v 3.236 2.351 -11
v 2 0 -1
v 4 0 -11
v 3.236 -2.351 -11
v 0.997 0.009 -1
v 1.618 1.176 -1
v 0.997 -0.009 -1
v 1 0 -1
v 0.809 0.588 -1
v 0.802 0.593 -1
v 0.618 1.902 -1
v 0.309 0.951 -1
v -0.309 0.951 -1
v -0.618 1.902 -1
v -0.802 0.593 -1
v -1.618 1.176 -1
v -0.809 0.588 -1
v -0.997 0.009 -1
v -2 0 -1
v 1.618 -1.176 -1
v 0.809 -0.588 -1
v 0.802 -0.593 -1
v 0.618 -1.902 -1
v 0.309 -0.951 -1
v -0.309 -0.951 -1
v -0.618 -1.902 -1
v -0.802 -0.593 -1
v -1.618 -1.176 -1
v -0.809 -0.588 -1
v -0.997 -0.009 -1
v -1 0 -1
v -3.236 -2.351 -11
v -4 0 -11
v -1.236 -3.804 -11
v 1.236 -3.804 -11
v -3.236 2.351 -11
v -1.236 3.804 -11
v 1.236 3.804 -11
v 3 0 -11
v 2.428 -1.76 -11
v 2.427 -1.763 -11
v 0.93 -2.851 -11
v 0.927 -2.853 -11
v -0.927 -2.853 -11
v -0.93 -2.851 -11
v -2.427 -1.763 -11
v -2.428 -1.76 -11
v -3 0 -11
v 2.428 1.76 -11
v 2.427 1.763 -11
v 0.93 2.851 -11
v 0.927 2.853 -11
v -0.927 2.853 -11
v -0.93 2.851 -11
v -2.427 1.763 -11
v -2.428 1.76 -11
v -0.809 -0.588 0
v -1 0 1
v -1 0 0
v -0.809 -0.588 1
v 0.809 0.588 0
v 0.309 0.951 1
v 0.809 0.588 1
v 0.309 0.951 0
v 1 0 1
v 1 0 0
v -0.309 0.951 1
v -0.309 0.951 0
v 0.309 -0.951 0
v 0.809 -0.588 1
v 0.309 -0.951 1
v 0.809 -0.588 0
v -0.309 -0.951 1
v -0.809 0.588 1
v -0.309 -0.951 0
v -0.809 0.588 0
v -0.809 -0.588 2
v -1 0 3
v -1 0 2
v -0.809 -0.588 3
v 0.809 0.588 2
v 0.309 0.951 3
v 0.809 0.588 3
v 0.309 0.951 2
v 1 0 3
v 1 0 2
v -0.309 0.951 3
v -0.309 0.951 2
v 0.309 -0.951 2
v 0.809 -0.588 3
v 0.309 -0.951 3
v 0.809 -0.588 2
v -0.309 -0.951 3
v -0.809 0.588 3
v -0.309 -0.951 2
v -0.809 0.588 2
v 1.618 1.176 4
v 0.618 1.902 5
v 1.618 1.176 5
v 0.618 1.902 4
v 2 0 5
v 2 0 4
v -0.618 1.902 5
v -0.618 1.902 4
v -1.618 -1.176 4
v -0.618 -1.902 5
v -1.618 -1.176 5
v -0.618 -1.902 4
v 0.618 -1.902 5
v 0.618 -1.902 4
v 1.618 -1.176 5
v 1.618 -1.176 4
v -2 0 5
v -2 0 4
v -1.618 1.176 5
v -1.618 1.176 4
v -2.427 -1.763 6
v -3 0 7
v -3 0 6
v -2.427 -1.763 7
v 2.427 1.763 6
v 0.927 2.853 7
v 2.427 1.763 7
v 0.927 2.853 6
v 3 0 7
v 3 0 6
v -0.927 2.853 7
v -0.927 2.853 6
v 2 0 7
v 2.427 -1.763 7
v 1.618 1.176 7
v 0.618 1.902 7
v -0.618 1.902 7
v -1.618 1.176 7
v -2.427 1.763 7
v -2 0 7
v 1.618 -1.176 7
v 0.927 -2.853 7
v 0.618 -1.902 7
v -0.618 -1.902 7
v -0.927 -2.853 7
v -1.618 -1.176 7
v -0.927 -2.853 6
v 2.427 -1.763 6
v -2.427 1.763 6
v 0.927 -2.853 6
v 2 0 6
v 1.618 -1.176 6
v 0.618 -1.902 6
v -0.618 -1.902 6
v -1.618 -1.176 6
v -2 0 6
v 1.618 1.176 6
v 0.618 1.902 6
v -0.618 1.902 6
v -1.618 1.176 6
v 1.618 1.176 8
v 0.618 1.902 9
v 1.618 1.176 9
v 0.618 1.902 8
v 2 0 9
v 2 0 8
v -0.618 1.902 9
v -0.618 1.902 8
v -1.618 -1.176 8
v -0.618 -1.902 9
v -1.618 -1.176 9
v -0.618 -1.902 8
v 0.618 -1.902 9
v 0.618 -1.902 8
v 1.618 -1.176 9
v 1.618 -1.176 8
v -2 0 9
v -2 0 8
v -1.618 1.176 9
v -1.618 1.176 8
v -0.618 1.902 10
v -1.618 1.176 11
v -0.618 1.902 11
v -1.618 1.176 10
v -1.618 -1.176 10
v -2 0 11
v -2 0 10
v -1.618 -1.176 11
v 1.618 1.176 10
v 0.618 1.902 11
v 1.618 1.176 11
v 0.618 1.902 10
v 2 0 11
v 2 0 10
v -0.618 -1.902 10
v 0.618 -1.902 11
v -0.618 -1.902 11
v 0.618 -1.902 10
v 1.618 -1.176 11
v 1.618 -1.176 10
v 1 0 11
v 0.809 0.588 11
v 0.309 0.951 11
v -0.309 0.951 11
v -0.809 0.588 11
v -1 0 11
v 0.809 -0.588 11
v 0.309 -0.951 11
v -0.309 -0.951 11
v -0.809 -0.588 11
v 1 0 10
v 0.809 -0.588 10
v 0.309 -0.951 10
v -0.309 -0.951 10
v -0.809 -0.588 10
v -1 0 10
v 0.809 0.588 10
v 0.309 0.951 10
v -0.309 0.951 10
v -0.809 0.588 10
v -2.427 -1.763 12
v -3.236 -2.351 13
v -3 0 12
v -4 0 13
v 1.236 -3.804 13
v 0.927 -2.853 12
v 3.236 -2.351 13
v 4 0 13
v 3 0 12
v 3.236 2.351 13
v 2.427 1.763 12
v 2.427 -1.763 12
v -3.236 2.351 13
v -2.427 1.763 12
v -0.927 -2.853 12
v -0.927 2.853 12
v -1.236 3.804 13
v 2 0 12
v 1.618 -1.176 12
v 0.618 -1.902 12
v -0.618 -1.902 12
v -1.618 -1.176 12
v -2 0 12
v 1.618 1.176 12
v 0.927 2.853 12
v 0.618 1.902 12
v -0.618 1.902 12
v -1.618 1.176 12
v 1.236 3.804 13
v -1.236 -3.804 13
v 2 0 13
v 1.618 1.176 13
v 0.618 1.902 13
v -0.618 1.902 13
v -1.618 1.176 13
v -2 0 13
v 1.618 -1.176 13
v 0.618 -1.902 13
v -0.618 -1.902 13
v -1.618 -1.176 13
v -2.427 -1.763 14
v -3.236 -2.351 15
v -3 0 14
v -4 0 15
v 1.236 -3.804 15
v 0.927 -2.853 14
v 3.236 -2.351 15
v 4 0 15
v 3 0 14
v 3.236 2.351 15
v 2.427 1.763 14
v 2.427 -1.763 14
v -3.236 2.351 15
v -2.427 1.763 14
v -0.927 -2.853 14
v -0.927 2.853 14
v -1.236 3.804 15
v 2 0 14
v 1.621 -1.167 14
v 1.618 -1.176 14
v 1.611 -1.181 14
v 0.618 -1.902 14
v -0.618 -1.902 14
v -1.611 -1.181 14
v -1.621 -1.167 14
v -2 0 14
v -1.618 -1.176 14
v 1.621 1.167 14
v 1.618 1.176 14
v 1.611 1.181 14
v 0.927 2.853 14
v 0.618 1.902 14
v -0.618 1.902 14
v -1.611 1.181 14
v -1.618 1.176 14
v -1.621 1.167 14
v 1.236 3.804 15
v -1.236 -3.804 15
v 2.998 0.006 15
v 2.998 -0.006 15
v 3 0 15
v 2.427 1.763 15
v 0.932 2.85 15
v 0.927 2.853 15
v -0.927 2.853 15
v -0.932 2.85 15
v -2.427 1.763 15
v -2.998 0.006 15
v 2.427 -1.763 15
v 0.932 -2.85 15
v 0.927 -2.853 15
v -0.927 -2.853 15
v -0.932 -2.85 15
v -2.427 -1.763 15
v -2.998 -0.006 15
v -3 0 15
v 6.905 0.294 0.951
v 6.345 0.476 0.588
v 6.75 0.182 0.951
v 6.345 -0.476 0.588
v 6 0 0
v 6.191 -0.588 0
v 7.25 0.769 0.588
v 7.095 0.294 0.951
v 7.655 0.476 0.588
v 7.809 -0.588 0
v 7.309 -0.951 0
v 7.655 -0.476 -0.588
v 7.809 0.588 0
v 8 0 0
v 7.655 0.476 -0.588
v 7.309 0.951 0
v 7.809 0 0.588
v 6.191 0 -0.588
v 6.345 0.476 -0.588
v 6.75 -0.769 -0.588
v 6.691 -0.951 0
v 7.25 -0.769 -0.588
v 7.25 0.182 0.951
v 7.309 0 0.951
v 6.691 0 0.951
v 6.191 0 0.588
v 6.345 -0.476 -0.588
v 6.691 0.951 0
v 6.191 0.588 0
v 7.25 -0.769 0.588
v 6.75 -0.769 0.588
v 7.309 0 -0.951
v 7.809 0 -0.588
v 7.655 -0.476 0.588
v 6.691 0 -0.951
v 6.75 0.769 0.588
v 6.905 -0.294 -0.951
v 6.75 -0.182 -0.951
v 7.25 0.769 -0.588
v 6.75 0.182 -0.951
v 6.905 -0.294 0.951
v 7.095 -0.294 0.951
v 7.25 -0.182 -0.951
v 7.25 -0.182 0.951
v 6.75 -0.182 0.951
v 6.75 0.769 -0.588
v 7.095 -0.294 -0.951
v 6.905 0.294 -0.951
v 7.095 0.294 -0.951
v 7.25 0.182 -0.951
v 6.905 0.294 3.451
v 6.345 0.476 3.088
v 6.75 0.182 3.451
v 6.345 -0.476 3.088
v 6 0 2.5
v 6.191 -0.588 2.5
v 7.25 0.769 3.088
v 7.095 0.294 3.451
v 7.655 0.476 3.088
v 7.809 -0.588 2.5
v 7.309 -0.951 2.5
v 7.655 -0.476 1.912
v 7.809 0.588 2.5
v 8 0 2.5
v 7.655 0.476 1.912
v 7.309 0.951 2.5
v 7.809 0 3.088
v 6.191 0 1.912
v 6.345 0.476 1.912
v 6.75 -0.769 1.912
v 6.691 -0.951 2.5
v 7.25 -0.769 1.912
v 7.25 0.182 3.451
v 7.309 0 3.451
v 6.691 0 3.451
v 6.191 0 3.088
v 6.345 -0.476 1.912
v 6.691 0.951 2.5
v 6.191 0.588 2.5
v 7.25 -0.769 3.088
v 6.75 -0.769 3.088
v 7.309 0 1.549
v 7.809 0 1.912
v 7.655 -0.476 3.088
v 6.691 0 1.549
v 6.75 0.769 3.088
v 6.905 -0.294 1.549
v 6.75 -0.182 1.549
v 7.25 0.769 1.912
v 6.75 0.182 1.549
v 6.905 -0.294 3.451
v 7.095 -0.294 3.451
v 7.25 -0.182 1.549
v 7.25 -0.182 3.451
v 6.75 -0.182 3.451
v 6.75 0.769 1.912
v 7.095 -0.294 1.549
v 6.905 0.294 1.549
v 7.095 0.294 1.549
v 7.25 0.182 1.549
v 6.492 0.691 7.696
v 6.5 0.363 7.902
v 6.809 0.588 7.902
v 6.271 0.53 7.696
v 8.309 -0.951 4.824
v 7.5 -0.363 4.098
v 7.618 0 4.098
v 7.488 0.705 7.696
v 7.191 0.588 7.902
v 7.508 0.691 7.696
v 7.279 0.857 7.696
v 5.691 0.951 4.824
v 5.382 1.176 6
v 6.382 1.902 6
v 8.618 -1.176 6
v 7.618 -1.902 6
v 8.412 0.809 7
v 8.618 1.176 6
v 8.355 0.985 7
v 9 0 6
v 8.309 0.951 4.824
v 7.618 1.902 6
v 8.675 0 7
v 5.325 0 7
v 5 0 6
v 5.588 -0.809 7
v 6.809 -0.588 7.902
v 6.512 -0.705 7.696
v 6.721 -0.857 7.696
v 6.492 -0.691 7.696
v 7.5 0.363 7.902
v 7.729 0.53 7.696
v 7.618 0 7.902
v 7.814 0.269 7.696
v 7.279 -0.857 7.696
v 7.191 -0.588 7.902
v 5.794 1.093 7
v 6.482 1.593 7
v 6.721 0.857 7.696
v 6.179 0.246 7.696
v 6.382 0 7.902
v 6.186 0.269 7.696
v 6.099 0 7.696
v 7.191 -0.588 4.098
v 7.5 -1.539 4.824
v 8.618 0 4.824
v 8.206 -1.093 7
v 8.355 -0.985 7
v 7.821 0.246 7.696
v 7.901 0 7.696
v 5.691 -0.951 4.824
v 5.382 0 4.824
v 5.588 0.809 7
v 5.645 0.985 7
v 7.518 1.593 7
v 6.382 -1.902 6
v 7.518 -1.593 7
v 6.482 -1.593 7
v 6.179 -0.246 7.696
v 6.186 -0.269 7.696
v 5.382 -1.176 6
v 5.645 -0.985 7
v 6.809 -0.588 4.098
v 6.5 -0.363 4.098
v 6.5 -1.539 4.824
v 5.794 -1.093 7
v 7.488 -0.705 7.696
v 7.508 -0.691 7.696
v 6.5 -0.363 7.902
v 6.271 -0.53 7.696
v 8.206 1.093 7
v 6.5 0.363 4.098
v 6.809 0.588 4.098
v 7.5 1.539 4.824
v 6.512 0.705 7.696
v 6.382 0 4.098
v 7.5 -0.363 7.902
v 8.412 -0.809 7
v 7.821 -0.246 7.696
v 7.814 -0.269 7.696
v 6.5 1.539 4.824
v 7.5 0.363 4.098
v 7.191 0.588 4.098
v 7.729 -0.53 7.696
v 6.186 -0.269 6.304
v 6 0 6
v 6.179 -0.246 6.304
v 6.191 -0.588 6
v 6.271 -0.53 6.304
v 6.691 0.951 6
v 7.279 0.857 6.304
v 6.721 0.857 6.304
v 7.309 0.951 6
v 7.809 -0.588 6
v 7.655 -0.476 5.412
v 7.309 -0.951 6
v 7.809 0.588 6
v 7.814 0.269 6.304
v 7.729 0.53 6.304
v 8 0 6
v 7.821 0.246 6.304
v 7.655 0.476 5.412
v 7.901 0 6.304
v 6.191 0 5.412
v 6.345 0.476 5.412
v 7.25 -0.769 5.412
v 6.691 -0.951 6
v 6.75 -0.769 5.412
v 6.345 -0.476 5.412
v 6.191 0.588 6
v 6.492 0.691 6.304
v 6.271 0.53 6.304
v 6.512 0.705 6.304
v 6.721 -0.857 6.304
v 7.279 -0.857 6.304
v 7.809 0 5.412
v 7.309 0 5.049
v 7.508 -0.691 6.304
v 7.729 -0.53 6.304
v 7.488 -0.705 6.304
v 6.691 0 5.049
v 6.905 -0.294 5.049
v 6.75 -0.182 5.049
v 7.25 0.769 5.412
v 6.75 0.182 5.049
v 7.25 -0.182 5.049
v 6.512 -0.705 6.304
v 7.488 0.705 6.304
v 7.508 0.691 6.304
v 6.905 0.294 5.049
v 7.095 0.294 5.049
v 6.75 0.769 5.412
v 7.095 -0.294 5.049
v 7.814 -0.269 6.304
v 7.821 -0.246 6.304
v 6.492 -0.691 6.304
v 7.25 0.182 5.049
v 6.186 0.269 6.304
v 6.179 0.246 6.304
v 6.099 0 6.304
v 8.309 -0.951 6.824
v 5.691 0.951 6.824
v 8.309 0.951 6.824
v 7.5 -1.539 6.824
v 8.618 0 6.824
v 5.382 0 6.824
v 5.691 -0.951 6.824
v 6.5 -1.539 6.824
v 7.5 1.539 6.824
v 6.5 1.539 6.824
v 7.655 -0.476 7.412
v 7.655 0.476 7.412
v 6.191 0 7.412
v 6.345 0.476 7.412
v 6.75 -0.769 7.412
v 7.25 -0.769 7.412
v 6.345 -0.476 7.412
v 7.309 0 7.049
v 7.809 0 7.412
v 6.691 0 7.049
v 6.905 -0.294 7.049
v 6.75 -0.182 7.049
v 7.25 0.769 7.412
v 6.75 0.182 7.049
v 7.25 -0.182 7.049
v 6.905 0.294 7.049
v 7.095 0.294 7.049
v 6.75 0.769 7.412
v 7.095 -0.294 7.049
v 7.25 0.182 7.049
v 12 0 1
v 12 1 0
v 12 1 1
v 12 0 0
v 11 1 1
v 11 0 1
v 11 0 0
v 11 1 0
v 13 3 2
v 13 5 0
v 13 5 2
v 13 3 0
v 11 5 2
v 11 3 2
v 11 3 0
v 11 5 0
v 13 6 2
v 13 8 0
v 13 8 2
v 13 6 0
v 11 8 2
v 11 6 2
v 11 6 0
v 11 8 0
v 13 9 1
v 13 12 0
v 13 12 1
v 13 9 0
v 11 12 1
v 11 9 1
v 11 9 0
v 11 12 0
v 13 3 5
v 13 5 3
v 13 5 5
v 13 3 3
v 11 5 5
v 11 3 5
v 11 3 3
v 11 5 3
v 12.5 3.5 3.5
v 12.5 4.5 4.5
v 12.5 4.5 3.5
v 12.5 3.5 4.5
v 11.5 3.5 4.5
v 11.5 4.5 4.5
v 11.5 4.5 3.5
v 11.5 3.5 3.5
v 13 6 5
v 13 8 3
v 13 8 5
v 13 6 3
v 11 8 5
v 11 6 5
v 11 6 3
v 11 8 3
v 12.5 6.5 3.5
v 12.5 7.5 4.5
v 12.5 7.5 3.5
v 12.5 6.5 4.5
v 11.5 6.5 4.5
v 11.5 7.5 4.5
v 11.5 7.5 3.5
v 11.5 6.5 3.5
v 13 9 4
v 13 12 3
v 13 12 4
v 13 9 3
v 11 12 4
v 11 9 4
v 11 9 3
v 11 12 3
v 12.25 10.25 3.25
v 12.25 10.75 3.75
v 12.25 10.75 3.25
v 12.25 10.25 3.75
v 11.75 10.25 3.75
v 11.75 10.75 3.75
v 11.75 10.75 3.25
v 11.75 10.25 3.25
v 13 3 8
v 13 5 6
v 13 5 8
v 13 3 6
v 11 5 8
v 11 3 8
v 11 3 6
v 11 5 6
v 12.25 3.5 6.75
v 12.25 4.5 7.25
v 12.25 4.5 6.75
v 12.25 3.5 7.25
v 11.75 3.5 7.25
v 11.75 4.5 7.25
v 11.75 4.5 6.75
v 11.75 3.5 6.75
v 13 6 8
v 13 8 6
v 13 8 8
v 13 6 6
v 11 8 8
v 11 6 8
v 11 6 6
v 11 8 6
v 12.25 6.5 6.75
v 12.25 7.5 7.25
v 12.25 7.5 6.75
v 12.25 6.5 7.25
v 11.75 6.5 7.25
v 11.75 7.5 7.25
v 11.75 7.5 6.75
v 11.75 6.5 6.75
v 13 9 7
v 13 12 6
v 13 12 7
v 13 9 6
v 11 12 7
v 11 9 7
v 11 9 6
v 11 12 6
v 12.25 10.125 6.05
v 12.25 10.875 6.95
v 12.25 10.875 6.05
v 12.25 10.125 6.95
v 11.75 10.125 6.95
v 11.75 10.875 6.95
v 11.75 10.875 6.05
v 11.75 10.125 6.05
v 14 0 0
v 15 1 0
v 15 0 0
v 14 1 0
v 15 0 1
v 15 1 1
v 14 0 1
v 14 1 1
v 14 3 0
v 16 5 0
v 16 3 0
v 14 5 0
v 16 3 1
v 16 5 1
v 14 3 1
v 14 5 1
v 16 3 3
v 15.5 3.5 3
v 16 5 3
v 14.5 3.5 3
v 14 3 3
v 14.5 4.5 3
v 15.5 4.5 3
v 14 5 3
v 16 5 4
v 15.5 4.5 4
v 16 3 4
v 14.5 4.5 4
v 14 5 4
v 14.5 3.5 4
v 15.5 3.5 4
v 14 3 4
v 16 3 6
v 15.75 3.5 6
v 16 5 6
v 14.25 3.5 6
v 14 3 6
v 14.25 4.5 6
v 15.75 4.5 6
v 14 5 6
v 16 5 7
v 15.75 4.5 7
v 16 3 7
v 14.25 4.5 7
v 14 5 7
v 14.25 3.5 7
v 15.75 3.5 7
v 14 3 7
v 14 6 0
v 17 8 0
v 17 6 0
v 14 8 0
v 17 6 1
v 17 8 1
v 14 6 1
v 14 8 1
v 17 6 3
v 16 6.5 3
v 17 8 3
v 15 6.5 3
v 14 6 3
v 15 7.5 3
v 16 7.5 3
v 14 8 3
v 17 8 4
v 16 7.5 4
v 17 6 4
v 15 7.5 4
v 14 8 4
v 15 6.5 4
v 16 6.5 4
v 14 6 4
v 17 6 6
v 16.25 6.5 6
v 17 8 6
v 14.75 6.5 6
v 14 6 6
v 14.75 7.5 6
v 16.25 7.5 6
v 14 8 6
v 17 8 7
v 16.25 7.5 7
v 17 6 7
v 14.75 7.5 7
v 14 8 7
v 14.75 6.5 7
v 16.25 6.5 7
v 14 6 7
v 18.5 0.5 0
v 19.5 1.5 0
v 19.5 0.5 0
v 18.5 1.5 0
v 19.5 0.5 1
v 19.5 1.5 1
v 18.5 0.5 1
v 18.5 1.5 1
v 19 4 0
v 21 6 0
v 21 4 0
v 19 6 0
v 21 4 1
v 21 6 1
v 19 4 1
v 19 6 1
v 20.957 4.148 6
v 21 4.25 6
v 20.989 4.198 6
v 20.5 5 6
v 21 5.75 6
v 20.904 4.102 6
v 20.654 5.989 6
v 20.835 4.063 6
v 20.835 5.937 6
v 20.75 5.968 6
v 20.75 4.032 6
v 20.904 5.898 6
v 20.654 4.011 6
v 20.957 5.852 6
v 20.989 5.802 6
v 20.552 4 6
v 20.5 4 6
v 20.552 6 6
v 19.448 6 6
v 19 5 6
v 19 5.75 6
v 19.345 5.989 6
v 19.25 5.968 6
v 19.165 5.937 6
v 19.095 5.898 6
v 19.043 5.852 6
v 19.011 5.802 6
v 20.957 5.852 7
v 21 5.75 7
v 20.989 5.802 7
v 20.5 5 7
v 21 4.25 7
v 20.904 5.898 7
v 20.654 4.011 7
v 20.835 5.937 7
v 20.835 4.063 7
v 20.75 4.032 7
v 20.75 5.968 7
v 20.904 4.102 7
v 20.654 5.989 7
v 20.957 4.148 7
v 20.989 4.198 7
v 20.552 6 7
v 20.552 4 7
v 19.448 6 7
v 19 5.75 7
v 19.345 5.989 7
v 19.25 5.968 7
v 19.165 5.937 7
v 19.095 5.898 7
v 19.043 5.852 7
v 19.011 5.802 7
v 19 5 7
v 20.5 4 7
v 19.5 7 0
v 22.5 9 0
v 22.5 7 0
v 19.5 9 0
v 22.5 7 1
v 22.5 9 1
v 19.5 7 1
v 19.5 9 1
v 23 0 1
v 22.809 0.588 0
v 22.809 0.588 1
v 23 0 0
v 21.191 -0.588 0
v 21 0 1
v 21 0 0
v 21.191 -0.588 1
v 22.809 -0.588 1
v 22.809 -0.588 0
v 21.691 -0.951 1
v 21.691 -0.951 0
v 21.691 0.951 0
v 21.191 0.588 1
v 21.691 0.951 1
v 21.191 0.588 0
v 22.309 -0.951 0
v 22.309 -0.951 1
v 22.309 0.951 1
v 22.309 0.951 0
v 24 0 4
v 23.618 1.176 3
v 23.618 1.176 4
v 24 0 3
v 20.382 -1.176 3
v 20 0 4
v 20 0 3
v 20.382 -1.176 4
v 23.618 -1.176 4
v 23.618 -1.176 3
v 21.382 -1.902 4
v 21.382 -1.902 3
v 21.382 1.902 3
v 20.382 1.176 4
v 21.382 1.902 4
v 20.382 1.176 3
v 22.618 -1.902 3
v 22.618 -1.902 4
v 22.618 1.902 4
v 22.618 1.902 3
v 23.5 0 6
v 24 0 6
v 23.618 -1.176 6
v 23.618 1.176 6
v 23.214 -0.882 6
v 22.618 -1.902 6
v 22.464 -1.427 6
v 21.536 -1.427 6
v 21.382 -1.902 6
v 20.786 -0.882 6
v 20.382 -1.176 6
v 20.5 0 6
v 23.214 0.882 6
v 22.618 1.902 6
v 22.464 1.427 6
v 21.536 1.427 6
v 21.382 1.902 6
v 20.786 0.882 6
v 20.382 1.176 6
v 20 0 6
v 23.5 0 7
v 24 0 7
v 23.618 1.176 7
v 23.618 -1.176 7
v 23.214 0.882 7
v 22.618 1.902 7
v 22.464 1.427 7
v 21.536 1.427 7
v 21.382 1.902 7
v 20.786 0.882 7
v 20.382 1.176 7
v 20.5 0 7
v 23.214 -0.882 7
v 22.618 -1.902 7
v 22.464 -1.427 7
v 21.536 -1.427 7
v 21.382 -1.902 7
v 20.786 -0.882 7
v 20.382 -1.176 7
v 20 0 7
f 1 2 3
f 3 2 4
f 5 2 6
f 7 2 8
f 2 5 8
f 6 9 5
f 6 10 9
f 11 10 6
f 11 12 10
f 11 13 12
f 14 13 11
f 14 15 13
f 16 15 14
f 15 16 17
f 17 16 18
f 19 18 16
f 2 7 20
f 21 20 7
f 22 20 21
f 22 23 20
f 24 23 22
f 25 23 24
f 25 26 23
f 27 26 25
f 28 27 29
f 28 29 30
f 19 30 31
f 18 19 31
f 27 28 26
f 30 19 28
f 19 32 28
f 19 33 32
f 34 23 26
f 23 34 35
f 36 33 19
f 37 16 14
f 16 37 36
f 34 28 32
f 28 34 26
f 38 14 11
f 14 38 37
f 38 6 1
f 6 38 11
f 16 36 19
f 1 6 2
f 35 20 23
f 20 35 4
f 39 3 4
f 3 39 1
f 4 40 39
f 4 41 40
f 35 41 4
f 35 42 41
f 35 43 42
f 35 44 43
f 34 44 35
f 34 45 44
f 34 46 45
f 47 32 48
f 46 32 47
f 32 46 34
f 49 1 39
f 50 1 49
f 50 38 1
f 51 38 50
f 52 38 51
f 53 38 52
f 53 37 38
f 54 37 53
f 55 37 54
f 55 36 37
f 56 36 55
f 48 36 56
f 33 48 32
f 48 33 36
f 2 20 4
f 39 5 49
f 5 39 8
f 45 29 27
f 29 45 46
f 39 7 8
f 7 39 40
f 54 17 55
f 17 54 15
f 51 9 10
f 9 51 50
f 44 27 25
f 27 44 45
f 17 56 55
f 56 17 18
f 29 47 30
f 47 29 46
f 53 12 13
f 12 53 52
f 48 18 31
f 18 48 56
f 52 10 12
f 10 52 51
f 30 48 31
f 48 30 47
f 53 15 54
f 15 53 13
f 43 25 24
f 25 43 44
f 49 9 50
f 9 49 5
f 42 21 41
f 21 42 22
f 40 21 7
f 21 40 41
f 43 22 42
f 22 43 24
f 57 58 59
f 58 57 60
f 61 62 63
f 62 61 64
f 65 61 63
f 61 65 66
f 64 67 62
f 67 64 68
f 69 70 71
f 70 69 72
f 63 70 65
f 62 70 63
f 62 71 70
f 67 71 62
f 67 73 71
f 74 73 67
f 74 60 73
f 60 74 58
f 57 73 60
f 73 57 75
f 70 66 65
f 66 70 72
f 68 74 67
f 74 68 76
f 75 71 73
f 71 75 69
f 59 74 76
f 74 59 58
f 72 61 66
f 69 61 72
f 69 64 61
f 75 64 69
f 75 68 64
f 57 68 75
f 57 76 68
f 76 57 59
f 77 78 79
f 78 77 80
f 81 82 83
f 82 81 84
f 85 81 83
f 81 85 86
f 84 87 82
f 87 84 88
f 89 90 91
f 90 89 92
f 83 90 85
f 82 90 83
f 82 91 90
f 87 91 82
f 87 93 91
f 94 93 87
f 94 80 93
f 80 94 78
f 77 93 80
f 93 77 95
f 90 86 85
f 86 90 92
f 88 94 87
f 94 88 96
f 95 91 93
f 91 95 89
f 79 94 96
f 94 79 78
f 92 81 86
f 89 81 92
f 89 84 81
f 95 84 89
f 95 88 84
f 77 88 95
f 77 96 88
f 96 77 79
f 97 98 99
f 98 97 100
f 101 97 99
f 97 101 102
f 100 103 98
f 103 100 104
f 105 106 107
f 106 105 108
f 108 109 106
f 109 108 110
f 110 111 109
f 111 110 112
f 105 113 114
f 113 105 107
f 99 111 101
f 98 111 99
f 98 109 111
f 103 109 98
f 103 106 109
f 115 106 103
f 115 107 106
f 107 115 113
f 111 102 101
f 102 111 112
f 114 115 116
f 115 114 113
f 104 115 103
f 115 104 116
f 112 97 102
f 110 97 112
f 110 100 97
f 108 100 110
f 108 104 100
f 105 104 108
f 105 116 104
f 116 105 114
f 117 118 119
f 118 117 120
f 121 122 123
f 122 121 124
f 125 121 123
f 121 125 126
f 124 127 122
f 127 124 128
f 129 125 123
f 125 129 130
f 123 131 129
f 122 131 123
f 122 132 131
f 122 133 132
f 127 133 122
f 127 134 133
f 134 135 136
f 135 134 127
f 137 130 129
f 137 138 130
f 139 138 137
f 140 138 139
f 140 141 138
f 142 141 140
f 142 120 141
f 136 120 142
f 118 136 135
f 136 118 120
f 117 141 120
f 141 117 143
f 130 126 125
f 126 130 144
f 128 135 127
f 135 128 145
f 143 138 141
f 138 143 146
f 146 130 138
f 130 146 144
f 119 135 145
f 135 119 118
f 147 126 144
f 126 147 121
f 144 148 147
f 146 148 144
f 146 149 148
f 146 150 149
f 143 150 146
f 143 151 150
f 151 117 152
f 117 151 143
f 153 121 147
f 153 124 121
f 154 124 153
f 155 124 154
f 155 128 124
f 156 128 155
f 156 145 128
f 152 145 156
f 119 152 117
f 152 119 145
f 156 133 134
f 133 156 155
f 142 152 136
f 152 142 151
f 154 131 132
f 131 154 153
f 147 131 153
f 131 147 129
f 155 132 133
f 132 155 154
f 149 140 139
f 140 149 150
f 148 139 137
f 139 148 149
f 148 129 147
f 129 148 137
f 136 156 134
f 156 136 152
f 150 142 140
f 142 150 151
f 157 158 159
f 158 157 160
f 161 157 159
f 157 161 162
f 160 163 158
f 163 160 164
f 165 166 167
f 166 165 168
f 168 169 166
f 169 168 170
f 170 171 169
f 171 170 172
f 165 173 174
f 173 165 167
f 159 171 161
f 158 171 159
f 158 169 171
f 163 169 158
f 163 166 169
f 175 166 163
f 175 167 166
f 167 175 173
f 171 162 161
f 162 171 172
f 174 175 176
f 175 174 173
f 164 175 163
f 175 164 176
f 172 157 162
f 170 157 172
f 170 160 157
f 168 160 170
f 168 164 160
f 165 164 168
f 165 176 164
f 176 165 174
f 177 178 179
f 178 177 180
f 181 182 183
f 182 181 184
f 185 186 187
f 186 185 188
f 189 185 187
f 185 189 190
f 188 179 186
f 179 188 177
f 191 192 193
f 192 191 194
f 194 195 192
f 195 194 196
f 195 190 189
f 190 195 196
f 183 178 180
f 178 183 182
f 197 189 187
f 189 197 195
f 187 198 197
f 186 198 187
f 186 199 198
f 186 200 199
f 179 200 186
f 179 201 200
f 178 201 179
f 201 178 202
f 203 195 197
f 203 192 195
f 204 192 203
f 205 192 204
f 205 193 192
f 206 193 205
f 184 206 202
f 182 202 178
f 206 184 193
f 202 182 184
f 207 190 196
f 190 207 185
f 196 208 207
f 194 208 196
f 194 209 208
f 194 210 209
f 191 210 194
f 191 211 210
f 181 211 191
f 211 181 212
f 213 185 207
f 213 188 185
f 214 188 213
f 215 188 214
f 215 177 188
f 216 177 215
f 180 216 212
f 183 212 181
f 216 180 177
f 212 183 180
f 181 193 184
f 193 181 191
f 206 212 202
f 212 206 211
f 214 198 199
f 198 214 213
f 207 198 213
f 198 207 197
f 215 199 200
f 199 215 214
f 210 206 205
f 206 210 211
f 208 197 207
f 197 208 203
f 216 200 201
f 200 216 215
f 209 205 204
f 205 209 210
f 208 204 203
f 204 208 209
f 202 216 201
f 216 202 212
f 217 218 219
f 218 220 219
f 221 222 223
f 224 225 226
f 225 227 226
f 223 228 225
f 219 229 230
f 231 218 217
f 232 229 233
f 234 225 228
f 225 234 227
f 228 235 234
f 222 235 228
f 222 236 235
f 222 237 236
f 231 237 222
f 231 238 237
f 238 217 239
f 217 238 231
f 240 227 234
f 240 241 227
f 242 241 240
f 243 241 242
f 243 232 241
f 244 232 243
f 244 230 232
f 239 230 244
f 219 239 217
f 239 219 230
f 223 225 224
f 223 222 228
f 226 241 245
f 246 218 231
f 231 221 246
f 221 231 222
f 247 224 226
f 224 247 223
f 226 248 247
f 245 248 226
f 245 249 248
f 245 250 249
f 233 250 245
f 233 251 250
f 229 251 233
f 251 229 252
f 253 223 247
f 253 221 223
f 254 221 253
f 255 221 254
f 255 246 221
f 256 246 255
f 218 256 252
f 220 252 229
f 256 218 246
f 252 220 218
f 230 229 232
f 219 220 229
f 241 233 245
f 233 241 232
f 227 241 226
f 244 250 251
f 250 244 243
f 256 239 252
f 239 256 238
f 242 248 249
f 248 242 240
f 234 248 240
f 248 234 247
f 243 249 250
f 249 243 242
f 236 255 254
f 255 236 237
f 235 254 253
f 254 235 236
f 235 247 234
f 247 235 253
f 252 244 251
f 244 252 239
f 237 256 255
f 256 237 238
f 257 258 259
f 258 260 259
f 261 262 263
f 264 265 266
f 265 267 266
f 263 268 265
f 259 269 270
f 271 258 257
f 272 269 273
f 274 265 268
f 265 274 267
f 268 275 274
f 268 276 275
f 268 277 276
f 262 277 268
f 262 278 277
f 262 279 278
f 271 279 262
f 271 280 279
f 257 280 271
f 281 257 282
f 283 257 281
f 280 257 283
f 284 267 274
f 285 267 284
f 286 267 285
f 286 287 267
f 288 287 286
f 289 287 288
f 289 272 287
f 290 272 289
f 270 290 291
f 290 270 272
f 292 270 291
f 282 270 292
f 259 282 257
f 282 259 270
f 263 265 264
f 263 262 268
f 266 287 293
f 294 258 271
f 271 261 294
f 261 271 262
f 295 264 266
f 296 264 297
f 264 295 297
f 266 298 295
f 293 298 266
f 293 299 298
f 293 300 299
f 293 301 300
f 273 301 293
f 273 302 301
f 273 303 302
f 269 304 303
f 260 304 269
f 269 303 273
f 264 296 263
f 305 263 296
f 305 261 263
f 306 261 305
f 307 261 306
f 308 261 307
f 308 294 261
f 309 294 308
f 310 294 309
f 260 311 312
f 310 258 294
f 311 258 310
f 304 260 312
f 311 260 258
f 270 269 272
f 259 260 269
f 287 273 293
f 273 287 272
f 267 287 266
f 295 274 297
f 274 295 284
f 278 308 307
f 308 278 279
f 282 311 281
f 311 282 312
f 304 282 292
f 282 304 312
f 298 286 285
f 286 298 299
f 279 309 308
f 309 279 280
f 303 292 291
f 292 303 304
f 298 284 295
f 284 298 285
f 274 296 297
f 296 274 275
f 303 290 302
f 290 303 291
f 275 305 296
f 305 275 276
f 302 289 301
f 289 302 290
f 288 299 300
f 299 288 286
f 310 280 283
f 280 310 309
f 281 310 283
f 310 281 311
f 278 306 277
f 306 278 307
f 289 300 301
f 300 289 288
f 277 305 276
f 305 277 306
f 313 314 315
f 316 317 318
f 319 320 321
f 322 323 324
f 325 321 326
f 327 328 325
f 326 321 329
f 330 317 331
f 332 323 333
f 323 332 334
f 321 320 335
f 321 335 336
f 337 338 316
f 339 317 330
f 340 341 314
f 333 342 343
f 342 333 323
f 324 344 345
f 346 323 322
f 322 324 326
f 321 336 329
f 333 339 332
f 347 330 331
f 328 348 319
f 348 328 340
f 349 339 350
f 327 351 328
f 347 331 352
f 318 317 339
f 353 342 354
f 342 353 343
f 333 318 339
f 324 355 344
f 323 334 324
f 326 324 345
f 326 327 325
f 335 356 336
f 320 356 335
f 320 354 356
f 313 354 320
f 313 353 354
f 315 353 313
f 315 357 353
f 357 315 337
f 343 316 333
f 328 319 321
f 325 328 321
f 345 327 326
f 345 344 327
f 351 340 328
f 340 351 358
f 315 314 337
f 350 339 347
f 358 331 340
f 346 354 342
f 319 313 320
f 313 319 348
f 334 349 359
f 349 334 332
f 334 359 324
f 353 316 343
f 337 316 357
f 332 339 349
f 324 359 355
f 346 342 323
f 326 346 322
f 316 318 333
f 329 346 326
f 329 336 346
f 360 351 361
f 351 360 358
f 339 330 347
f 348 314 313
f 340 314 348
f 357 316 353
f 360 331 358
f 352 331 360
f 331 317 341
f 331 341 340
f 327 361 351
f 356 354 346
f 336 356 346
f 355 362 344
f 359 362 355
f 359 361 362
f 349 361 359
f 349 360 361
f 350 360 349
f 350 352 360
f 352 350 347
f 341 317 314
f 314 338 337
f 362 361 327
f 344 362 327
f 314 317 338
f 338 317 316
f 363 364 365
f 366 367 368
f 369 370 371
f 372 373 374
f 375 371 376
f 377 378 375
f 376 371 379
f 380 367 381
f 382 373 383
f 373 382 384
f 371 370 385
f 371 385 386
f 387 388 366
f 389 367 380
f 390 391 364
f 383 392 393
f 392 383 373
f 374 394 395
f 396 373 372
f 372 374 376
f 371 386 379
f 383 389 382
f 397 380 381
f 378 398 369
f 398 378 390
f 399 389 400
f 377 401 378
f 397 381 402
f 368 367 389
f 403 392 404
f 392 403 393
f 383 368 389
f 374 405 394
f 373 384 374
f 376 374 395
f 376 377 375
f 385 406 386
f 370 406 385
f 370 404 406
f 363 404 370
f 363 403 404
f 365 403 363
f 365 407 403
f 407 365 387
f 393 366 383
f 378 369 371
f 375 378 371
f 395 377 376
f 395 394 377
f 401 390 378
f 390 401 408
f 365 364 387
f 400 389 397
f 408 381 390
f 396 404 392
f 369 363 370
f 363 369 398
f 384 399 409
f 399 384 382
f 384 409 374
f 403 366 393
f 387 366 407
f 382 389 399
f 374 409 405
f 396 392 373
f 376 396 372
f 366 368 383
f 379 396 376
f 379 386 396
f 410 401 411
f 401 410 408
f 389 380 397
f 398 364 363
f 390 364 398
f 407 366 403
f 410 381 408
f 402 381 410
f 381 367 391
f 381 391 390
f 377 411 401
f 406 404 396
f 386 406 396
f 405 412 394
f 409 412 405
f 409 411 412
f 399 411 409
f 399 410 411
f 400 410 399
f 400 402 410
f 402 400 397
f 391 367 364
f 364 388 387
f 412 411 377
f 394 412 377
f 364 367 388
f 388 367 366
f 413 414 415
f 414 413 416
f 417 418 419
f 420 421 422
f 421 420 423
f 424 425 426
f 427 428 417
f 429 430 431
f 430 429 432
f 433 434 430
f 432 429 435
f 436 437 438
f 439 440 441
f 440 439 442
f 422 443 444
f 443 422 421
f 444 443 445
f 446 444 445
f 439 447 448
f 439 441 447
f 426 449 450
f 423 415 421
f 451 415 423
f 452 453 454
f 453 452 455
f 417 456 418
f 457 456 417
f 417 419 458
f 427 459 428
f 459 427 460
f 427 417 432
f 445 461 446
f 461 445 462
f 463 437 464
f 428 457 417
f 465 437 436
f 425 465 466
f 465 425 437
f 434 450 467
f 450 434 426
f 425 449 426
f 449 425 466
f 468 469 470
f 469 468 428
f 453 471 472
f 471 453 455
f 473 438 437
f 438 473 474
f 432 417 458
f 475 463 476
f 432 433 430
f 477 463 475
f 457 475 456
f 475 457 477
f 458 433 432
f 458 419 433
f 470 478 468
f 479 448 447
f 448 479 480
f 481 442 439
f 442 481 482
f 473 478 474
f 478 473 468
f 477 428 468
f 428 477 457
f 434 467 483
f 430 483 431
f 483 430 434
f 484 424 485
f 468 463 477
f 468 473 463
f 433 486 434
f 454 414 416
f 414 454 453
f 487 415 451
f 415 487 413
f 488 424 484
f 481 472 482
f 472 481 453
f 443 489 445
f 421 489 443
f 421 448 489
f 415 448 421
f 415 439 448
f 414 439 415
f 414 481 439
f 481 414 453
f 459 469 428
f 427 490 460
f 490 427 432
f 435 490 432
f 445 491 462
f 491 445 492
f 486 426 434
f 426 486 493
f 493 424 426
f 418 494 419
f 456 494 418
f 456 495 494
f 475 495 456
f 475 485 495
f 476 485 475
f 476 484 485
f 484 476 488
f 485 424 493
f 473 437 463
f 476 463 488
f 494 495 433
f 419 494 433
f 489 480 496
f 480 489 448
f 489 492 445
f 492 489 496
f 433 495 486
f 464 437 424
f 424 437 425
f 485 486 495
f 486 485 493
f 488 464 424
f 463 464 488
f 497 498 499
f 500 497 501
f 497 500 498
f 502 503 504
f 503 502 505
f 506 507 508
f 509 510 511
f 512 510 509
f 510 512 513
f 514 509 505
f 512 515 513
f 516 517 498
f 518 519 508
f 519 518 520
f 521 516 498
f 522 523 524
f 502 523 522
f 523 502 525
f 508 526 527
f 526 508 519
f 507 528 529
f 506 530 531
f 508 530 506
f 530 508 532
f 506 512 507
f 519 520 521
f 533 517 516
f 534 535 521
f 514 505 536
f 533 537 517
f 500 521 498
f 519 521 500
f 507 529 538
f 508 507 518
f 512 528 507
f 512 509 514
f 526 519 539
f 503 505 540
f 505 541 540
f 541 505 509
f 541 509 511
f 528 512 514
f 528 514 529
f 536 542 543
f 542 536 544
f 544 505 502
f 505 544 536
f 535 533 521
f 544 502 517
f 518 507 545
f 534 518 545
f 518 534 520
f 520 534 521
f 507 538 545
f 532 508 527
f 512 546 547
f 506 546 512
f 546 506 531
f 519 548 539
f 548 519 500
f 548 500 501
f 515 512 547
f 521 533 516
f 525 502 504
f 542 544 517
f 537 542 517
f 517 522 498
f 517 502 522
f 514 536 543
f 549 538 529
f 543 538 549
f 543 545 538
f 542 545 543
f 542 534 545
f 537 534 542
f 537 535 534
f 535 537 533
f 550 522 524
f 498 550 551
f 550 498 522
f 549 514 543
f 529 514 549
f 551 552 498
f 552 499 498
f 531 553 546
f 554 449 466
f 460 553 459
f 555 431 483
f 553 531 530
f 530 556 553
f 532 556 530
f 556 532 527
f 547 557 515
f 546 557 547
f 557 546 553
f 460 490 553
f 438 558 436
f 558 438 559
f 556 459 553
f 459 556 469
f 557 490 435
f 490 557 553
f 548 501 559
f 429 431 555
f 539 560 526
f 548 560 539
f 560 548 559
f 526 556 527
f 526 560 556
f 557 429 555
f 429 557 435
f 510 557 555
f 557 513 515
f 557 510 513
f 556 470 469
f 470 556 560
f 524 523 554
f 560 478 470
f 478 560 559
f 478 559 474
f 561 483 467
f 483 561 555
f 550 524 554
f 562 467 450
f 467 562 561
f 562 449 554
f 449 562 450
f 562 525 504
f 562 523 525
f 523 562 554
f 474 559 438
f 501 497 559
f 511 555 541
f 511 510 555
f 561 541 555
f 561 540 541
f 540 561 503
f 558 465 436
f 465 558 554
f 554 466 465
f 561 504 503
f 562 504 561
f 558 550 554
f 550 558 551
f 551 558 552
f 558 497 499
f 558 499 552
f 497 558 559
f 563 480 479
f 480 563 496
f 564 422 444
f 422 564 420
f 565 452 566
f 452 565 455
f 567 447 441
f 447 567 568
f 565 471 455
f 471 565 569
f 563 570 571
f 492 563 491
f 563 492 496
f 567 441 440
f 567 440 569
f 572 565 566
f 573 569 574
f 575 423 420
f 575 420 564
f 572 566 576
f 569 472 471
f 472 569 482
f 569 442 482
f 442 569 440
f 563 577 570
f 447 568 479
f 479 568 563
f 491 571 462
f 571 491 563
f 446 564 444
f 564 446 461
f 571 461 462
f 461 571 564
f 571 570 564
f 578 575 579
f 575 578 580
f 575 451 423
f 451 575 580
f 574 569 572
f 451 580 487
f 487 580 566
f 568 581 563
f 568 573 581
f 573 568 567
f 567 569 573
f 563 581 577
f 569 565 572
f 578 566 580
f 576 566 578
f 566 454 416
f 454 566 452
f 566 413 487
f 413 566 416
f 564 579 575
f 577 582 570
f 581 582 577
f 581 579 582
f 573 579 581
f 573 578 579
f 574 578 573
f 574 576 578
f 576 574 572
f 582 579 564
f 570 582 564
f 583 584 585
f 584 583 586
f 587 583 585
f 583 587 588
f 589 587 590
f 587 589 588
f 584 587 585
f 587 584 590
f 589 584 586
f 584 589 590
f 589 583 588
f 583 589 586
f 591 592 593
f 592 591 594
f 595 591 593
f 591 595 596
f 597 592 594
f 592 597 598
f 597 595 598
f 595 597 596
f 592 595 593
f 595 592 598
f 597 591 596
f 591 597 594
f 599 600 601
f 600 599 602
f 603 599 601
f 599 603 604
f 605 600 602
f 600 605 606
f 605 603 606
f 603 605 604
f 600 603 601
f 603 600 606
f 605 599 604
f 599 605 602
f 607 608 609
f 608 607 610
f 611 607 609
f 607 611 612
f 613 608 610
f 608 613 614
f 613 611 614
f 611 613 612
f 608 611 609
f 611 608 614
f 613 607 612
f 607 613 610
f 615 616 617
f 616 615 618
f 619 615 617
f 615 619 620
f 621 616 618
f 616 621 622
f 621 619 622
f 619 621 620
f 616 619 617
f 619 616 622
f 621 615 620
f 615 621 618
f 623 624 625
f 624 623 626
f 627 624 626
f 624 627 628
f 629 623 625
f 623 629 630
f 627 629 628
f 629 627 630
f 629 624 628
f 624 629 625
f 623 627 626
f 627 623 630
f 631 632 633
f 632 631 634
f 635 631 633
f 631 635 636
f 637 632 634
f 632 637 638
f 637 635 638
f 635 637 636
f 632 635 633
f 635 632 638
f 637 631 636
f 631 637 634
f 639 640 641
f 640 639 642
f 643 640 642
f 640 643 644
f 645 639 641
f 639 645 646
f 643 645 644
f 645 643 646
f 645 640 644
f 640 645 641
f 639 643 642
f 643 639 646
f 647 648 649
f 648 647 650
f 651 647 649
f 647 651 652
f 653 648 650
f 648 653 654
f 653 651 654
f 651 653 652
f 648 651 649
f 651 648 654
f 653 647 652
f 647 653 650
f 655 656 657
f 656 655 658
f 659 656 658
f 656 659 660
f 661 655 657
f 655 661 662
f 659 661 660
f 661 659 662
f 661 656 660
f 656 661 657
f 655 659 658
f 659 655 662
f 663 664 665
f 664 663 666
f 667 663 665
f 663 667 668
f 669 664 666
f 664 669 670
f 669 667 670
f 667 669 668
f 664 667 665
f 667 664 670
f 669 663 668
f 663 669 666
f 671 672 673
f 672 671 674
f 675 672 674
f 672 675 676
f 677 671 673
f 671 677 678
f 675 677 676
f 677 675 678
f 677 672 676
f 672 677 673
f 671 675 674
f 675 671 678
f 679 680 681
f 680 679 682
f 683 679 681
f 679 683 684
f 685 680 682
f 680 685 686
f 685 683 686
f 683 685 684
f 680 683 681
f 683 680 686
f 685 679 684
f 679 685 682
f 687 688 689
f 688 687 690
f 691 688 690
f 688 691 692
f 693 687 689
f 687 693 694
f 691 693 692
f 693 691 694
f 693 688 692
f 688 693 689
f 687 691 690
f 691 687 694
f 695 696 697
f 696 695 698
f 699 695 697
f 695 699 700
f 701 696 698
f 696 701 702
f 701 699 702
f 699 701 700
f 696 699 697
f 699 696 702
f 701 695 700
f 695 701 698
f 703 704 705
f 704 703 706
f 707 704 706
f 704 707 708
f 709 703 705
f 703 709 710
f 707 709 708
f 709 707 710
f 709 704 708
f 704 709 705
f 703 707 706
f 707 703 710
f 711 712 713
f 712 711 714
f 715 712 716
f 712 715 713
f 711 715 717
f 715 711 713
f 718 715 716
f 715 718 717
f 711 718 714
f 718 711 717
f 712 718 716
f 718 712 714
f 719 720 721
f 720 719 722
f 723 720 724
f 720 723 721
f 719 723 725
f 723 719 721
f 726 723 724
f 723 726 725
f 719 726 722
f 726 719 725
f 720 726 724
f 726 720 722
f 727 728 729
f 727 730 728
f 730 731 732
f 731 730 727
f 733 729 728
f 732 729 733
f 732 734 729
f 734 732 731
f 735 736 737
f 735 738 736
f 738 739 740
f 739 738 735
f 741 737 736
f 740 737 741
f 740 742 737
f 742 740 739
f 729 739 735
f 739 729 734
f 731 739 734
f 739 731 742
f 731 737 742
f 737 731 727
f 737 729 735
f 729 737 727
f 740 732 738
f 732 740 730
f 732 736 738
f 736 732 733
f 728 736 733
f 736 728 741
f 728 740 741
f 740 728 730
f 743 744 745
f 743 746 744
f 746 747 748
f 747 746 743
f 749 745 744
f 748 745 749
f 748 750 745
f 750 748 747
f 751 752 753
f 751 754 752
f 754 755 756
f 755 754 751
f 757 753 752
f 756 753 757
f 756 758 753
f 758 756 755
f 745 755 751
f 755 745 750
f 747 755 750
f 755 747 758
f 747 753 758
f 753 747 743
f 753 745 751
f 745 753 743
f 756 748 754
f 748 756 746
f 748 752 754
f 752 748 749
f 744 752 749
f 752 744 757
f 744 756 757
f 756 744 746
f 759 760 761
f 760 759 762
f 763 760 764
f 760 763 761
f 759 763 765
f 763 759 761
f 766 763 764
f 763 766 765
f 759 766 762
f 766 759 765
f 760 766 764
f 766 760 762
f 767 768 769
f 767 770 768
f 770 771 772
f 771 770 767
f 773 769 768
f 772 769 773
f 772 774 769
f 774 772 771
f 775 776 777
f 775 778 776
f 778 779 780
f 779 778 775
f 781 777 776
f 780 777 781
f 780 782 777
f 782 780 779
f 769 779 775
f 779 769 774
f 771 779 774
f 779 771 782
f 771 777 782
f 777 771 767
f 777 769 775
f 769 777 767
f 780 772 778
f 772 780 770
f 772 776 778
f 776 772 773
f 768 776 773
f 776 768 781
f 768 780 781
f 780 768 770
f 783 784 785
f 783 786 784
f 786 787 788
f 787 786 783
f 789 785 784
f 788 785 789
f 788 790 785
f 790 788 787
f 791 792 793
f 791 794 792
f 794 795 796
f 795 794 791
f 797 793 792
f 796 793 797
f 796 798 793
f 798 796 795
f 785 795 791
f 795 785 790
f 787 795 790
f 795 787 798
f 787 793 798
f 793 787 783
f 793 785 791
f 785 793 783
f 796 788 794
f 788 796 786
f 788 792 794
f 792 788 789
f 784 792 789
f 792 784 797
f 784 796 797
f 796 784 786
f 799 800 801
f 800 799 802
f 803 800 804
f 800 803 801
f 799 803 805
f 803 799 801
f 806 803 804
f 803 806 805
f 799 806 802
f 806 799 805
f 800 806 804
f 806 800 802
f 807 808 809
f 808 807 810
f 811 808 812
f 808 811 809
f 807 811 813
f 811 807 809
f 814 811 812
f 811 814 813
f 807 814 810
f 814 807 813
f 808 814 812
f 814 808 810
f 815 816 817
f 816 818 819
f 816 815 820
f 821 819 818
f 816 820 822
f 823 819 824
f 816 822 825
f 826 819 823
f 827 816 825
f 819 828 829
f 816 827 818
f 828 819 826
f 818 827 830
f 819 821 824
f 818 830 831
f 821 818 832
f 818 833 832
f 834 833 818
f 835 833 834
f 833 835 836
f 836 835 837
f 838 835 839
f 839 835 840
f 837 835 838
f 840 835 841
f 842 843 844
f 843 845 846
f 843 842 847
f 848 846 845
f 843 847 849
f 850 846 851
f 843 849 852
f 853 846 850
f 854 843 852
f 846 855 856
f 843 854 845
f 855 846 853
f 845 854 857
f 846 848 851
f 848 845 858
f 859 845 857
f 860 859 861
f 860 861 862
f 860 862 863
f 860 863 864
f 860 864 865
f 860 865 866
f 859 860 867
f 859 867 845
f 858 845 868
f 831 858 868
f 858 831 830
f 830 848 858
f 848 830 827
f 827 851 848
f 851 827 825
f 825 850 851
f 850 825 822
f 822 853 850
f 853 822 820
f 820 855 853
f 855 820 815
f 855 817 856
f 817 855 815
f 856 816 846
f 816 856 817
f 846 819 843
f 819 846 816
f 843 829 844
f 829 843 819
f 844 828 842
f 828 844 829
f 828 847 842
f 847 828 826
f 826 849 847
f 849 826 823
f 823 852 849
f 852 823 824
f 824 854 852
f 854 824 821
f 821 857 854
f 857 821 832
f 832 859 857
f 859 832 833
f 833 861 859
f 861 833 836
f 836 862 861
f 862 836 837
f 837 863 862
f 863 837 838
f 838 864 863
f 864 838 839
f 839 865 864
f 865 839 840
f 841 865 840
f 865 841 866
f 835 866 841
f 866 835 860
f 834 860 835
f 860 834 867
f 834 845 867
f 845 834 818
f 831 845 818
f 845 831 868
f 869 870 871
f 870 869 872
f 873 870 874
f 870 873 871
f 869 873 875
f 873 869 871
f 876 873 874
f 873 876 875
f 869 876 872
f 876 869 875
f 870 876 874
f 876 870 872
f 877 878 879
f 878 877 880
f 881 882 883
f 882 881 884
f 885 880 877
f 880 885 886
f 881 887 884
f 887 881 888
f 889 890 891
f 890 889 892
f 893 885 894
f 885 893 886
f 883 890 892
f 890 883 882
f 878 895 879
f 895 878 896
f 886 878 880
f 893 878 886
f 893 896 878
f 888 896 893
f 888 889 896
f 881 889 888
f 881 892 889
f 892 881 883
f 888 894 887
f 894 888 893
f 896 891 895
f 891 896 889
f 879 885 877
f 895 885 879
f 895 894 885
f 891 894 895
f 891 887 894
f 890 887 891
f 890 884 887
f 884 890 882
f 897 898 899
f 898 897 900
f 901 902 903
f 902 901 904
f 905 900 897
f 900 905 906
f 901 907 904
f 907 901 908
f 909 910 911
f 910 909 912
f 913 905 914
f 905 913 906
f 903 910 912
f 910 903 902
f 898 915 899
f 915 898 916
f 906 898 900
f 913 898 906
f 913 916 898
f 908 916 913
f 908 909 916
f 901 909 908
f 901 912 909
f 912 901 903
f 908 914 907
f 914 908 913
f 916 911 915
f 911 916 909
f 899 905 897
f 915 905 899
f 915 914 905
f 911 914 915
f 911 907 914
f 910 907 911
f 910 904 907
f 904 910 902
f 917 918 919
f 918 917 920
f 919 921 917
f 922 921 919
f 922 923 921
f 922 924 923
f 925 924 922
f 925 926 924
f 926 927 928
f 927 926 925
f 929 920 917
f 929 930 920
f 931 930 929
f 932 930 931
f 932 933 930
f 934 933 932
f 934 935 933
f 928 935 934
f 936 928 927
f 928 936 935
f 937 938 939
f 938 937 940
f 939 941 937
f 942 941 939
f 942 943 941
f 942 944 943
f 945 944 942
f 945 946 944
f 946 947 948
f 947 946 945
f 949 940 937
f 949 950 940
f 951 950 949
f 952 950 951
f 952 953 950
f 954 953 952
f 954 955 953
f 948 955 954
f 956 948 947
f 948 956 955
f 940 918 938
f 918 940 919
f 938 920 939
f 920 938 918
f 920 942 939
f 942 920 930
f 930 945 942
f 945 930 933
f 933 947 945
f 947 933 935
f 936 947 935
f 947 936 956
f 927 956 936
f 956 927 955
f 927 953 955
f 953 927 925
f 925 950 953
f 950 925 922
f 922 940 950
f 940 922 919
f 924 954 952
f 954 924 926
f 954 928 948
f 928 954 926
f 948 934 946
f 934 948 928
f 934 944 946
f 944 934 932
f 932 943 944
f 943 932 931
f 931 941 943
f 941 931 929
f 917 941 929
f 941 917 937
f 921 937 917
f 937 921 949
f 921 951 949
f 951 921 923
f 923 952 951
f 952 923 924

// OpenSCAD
// file: extended_cylinder.scad
b = 14; // bottom radius
t = 11; // top radius
h = 10; // height

// if no workey because a radius becomes negative, reduce the shift value
module extended_cylinder(h=0,r1=1,r2=1,shift=2,center=false) {
    slope = h / (r2-r1);
    // p for prime
    hp = (r1>0 && r2>0) ? h + shift : h + shift/2;
    bp = (r1>0)?r1-(1/slope)*(shift/2):0;
    tp = (r2>0)?r2+(1/slope)*(shift/2):0;
    translate([0,0,center?0:((r1>0)?-shift/2:0)])
    cylinder(hp,r1=bp,r2=tp,center=center);
}

difference(){
    cylinder(h,r=b+t,center=true);
    cylinder(h,r1=b,r2=t,center=true);
    translate([(b+t)/2,-(b+t)/2,0]) cube([b+t,b+t,h+1],center=true);
}

translate([2*(b+t)+10,0,0])
difference(){
    cylinder(h,r=b+t,center=true);
    extended_cylinder(h,b,t,0.1,true);
    translate([(b+t)/2,-(b+t)/2,0]) cube([b+t,b+t,h+1],center=true);
}
// file: round_square.scad
function is_undef ( a ) = (undef == a);
module round_square(size=1,radius=0) {
    x = is_undef(size[0])?size:size[0];
    y = is_undef(size[1])?(is_undef(size[0])?size:size[0]):size[1];
    r = radius;
    rx = min(x/2,is_undef(r[0])?r:r[0]);
    ry = min(y/2,is_undef(r[1])?(is_undef(r[0])?r:r[0]):r[1]);
    echo(r);
    echo(rx);
    echo(ry);
    translate([0,ry]) square([x,y-ry-ry]);
    translate([rx,0]) square([x-rx-rx,y]);
    if(rx>0 && ry>0) {
    translate([  rx,  ry]) resize([2*rx,2*ry]) circle();
    translate([x-rx,  ry]) resize([2*rx,2*ry]) circle();
    translate([x-rx,y-ry]) resize([2*rx,2*ry]) circle();
    translate([  rx,y-ry]) resize([2*rx,2*ry]) circle();
    }
}
$fn = 30;
//round_square([2,4],0);
round_square();
translate([0,0,1]) round_square(2);
translate([0,0,2]) round_square(2,0.5);
translate([0,0,3]) round_square([2],0.5);
translate([0,0,4]) round_square([2,3]);
translate([0,0,5]) round_square(2,[0.5]);
translate([0,0,6]) round_square([2,3],0.5);
translate([0,0,7]) round_square([2,3],[0.5,0.2]);
//translate([0.5,0.25]) resize([2*0.5,2*0.25]) circle();
// main file
use <round_square.scad>;
use <extended_cylinder.scad>;

function is_undef ( a ) = (undef == a);

module shell_cylinder(h=1, ro=1, ri=0, center=false) {
    r1i = is_undef(ri[0])?ri:ri[0];
    r2i = is_undef(ri[1])?(is_undef(ri[0])?ri:ri[0]):ri[1];
    r1o = is_undef(ro[0])?ro:ro[0];
    r2o = is_undef(ro[1])?(is_undef(ro[0])?ro:ro[0]):ro[1];
    difference() {
        cylinder(h,r1=r1o,r2=r2o,center=center);
        extended_cylinder(h,r1=r1i,r2=r2i,shift=h/100,center=center);
    }
}

module shell_sphere(ro=1, ri=0) {
    difference() {
        sphere(ro);
        sphere(ri);
    }
}

module shell_cube(o = 1, i = 0, center = false) {
    xo = is_undef(o[0])?o:o[0];
    yo = is_undef(o[1])?(is_undef(o[0])?o:o[0]):o[1];
    zo = is_undef(o[2])?(is_undef(o[0])?o:o[0]):o[2];
    xi = is_undef(i[0])?i:i[0];
    yi = is_undef(i[1])?(is_undef(i[0])?i:i[0]):i[1];
    zi = is_undef(i[2])?(is_undef(i[0])?i:i[0]):i[2];
    xt = center?0:xo/2;
    yt = center?0:yo/2;
    zt = center?0:zo/2;
    translate([xt,yt,zt]) // translate handles center param
    difference() {
        cube([xo,yo,zo],center=true);
        cube([xi,yi,zi],center=true);
    }
}

module shell_square(o = 1, i = 0, center = false) {
    xo = is_undef(o[0])?o:o[0];
    yo = is_undef(o[1])?(is_undef(o[0])?o:o[0]):o[1];
    xi = is_undef(i[0])?i:i[0];
    yi = is_undef(i[1])?(is_undef(i[0])?i:i[0]):i[1];
    xt = center?0:xo/2;
    yt = center?0:yo/2;
    translate([xt,yt]) // translate handles center param
    difference() {
        square([xo,yo],center=true);
        square([xi,yi],center=true);
    }
}

module shell_round_square(o = 1, i = 0, or = 0, ir = 0, center = false) {
    xo = is_undef(o[0])?o:o[0];
    yo = is_undef(o[1])?(is_undef(o[0])?o:o[0]):o[1];
    xi = is_undef(i[0])?i:i[0];
    yi = is_undef(i[1])?(is_undef(i[0])?i:i[0]):i[1];
    xor = is_undef(or[0])?or:or[0];
    yor = is_undef(or[1])?(is_undef(or[0])?or:or[0]):or[1];
    xir = is_undef(ir[0])?ir:ir[0];
    yir = is_undef(ir[1])?(is_undef(ir[0])?ir:ir[0]):ir[1];
    xt = center?0:xo/2;
    yt = center?0:yo/2;
    translate([xt,yt])
    difference() {
        round_square([xo,yo],[xor,yor]);
        round_square([xi,yi],[xir,yir]);
    }
}

module shell_circle(o = 1, i = 0) {
    difference() {
        circle(o);
        circle(i);
    }
}

$fn = 10;

translate([0,0,-6]) shell_cylinder(10,[4,2],[3,1],true);
translate([0,0,0]) shell_cylinder();
translate([0,0,2]) shell_cylinder(1);
translate([0,0,4]) shell_cylinder(1,2);
translate([0,0,6]) shell_cylinder(1,3,2);
translate([0,0,8]) shell_cylinder(1,[2]);
translate([0,0,10]) shell_cylinder(1,[2],1);
translate([0,0,12]) shell_cylinder(1,[3,4],2);
translate([0,0,14]) shell_cylinder(1,[3,4],[2,3]);

translate([7,0,0]) shell_sphere();
translate([7,0,2.5]) shell_sphere(1);
difference() {
    translate([7,0,6]) shell_sphere(2,1);
    translate([7,0,8]) shell_sphere(2,1);
}

translate([11,0,0]) shell_cube();
translate([11,3,0]) shell_cube(2);
translate([11,6,0]) shell_cube([2]);
translate([11,9,0]) shell_cube([2,3,1]);
translate([11,3,3]) shell_cube(2,1);
translate([11,6,3]) shell_cube([2],1);
translate([11,9,3]) shell_cube([2,3,1],0.5);
translate([11,3,6]) shell_cube(2,[0.5,1]);
translate([11,6,6]) shell_cube([2],[0.5,1]);
translate([11,9,6]) shell_cube([2,3,1],[0.5,0.75,0.9]);

translate([14,0,0]) linear_extrude(1) shell_square();
translate([14,3,0]) linear_extrude(1) shell_square(2);
translate([14,3,3]) linear_extrude(1) shell_square(2,1);
translate([14,3,6]) linear_extrude(1) shell_square(2,[1.5,1]);
translate([14,6,0]) linear_extrude(1) shell_square([3,2]);
translate([14,6,3]) linear_extrude(1) shell_square([3,2],1);
translate([14,6,6]) linear_extrude(1) shell_square([3,2],[1.5,1]);

translate([18,0,0]) linear_extrude(1) shell_round_square();
translate([18,3,0]) linear_extrude(1) shell_round_square(2);
translate([18,3,3]) linear_extrude(1) shell_round_square(2,1,[0.5,0.25],[0.25,0.5]);
translate([18,3,6]) linear_extrude(1) shell_round_square(2,[1.5,1],[0.5,0.25]);
translate([18,6,0]) linear_extrude(1) shell_round_square([3,2]);
translate([18,6,3]) linear_extrude(1) shell_round_square([3,2],1,[0.5,0.25],[0.25,0.5]);
translate([18,6,6]) linear_extrude(1) shell_round_square([3,2],[1.5,1],[0.5,0.25],,[0.25,0.5]);

translate([22,0,0]) linear_extrude(1) shell_circle();
translate([22,0,3]) linear_extrude(1) shell_circle(2);
translate([22,0,6]) linear_extrude(1) shell_circle(2,1.5);
